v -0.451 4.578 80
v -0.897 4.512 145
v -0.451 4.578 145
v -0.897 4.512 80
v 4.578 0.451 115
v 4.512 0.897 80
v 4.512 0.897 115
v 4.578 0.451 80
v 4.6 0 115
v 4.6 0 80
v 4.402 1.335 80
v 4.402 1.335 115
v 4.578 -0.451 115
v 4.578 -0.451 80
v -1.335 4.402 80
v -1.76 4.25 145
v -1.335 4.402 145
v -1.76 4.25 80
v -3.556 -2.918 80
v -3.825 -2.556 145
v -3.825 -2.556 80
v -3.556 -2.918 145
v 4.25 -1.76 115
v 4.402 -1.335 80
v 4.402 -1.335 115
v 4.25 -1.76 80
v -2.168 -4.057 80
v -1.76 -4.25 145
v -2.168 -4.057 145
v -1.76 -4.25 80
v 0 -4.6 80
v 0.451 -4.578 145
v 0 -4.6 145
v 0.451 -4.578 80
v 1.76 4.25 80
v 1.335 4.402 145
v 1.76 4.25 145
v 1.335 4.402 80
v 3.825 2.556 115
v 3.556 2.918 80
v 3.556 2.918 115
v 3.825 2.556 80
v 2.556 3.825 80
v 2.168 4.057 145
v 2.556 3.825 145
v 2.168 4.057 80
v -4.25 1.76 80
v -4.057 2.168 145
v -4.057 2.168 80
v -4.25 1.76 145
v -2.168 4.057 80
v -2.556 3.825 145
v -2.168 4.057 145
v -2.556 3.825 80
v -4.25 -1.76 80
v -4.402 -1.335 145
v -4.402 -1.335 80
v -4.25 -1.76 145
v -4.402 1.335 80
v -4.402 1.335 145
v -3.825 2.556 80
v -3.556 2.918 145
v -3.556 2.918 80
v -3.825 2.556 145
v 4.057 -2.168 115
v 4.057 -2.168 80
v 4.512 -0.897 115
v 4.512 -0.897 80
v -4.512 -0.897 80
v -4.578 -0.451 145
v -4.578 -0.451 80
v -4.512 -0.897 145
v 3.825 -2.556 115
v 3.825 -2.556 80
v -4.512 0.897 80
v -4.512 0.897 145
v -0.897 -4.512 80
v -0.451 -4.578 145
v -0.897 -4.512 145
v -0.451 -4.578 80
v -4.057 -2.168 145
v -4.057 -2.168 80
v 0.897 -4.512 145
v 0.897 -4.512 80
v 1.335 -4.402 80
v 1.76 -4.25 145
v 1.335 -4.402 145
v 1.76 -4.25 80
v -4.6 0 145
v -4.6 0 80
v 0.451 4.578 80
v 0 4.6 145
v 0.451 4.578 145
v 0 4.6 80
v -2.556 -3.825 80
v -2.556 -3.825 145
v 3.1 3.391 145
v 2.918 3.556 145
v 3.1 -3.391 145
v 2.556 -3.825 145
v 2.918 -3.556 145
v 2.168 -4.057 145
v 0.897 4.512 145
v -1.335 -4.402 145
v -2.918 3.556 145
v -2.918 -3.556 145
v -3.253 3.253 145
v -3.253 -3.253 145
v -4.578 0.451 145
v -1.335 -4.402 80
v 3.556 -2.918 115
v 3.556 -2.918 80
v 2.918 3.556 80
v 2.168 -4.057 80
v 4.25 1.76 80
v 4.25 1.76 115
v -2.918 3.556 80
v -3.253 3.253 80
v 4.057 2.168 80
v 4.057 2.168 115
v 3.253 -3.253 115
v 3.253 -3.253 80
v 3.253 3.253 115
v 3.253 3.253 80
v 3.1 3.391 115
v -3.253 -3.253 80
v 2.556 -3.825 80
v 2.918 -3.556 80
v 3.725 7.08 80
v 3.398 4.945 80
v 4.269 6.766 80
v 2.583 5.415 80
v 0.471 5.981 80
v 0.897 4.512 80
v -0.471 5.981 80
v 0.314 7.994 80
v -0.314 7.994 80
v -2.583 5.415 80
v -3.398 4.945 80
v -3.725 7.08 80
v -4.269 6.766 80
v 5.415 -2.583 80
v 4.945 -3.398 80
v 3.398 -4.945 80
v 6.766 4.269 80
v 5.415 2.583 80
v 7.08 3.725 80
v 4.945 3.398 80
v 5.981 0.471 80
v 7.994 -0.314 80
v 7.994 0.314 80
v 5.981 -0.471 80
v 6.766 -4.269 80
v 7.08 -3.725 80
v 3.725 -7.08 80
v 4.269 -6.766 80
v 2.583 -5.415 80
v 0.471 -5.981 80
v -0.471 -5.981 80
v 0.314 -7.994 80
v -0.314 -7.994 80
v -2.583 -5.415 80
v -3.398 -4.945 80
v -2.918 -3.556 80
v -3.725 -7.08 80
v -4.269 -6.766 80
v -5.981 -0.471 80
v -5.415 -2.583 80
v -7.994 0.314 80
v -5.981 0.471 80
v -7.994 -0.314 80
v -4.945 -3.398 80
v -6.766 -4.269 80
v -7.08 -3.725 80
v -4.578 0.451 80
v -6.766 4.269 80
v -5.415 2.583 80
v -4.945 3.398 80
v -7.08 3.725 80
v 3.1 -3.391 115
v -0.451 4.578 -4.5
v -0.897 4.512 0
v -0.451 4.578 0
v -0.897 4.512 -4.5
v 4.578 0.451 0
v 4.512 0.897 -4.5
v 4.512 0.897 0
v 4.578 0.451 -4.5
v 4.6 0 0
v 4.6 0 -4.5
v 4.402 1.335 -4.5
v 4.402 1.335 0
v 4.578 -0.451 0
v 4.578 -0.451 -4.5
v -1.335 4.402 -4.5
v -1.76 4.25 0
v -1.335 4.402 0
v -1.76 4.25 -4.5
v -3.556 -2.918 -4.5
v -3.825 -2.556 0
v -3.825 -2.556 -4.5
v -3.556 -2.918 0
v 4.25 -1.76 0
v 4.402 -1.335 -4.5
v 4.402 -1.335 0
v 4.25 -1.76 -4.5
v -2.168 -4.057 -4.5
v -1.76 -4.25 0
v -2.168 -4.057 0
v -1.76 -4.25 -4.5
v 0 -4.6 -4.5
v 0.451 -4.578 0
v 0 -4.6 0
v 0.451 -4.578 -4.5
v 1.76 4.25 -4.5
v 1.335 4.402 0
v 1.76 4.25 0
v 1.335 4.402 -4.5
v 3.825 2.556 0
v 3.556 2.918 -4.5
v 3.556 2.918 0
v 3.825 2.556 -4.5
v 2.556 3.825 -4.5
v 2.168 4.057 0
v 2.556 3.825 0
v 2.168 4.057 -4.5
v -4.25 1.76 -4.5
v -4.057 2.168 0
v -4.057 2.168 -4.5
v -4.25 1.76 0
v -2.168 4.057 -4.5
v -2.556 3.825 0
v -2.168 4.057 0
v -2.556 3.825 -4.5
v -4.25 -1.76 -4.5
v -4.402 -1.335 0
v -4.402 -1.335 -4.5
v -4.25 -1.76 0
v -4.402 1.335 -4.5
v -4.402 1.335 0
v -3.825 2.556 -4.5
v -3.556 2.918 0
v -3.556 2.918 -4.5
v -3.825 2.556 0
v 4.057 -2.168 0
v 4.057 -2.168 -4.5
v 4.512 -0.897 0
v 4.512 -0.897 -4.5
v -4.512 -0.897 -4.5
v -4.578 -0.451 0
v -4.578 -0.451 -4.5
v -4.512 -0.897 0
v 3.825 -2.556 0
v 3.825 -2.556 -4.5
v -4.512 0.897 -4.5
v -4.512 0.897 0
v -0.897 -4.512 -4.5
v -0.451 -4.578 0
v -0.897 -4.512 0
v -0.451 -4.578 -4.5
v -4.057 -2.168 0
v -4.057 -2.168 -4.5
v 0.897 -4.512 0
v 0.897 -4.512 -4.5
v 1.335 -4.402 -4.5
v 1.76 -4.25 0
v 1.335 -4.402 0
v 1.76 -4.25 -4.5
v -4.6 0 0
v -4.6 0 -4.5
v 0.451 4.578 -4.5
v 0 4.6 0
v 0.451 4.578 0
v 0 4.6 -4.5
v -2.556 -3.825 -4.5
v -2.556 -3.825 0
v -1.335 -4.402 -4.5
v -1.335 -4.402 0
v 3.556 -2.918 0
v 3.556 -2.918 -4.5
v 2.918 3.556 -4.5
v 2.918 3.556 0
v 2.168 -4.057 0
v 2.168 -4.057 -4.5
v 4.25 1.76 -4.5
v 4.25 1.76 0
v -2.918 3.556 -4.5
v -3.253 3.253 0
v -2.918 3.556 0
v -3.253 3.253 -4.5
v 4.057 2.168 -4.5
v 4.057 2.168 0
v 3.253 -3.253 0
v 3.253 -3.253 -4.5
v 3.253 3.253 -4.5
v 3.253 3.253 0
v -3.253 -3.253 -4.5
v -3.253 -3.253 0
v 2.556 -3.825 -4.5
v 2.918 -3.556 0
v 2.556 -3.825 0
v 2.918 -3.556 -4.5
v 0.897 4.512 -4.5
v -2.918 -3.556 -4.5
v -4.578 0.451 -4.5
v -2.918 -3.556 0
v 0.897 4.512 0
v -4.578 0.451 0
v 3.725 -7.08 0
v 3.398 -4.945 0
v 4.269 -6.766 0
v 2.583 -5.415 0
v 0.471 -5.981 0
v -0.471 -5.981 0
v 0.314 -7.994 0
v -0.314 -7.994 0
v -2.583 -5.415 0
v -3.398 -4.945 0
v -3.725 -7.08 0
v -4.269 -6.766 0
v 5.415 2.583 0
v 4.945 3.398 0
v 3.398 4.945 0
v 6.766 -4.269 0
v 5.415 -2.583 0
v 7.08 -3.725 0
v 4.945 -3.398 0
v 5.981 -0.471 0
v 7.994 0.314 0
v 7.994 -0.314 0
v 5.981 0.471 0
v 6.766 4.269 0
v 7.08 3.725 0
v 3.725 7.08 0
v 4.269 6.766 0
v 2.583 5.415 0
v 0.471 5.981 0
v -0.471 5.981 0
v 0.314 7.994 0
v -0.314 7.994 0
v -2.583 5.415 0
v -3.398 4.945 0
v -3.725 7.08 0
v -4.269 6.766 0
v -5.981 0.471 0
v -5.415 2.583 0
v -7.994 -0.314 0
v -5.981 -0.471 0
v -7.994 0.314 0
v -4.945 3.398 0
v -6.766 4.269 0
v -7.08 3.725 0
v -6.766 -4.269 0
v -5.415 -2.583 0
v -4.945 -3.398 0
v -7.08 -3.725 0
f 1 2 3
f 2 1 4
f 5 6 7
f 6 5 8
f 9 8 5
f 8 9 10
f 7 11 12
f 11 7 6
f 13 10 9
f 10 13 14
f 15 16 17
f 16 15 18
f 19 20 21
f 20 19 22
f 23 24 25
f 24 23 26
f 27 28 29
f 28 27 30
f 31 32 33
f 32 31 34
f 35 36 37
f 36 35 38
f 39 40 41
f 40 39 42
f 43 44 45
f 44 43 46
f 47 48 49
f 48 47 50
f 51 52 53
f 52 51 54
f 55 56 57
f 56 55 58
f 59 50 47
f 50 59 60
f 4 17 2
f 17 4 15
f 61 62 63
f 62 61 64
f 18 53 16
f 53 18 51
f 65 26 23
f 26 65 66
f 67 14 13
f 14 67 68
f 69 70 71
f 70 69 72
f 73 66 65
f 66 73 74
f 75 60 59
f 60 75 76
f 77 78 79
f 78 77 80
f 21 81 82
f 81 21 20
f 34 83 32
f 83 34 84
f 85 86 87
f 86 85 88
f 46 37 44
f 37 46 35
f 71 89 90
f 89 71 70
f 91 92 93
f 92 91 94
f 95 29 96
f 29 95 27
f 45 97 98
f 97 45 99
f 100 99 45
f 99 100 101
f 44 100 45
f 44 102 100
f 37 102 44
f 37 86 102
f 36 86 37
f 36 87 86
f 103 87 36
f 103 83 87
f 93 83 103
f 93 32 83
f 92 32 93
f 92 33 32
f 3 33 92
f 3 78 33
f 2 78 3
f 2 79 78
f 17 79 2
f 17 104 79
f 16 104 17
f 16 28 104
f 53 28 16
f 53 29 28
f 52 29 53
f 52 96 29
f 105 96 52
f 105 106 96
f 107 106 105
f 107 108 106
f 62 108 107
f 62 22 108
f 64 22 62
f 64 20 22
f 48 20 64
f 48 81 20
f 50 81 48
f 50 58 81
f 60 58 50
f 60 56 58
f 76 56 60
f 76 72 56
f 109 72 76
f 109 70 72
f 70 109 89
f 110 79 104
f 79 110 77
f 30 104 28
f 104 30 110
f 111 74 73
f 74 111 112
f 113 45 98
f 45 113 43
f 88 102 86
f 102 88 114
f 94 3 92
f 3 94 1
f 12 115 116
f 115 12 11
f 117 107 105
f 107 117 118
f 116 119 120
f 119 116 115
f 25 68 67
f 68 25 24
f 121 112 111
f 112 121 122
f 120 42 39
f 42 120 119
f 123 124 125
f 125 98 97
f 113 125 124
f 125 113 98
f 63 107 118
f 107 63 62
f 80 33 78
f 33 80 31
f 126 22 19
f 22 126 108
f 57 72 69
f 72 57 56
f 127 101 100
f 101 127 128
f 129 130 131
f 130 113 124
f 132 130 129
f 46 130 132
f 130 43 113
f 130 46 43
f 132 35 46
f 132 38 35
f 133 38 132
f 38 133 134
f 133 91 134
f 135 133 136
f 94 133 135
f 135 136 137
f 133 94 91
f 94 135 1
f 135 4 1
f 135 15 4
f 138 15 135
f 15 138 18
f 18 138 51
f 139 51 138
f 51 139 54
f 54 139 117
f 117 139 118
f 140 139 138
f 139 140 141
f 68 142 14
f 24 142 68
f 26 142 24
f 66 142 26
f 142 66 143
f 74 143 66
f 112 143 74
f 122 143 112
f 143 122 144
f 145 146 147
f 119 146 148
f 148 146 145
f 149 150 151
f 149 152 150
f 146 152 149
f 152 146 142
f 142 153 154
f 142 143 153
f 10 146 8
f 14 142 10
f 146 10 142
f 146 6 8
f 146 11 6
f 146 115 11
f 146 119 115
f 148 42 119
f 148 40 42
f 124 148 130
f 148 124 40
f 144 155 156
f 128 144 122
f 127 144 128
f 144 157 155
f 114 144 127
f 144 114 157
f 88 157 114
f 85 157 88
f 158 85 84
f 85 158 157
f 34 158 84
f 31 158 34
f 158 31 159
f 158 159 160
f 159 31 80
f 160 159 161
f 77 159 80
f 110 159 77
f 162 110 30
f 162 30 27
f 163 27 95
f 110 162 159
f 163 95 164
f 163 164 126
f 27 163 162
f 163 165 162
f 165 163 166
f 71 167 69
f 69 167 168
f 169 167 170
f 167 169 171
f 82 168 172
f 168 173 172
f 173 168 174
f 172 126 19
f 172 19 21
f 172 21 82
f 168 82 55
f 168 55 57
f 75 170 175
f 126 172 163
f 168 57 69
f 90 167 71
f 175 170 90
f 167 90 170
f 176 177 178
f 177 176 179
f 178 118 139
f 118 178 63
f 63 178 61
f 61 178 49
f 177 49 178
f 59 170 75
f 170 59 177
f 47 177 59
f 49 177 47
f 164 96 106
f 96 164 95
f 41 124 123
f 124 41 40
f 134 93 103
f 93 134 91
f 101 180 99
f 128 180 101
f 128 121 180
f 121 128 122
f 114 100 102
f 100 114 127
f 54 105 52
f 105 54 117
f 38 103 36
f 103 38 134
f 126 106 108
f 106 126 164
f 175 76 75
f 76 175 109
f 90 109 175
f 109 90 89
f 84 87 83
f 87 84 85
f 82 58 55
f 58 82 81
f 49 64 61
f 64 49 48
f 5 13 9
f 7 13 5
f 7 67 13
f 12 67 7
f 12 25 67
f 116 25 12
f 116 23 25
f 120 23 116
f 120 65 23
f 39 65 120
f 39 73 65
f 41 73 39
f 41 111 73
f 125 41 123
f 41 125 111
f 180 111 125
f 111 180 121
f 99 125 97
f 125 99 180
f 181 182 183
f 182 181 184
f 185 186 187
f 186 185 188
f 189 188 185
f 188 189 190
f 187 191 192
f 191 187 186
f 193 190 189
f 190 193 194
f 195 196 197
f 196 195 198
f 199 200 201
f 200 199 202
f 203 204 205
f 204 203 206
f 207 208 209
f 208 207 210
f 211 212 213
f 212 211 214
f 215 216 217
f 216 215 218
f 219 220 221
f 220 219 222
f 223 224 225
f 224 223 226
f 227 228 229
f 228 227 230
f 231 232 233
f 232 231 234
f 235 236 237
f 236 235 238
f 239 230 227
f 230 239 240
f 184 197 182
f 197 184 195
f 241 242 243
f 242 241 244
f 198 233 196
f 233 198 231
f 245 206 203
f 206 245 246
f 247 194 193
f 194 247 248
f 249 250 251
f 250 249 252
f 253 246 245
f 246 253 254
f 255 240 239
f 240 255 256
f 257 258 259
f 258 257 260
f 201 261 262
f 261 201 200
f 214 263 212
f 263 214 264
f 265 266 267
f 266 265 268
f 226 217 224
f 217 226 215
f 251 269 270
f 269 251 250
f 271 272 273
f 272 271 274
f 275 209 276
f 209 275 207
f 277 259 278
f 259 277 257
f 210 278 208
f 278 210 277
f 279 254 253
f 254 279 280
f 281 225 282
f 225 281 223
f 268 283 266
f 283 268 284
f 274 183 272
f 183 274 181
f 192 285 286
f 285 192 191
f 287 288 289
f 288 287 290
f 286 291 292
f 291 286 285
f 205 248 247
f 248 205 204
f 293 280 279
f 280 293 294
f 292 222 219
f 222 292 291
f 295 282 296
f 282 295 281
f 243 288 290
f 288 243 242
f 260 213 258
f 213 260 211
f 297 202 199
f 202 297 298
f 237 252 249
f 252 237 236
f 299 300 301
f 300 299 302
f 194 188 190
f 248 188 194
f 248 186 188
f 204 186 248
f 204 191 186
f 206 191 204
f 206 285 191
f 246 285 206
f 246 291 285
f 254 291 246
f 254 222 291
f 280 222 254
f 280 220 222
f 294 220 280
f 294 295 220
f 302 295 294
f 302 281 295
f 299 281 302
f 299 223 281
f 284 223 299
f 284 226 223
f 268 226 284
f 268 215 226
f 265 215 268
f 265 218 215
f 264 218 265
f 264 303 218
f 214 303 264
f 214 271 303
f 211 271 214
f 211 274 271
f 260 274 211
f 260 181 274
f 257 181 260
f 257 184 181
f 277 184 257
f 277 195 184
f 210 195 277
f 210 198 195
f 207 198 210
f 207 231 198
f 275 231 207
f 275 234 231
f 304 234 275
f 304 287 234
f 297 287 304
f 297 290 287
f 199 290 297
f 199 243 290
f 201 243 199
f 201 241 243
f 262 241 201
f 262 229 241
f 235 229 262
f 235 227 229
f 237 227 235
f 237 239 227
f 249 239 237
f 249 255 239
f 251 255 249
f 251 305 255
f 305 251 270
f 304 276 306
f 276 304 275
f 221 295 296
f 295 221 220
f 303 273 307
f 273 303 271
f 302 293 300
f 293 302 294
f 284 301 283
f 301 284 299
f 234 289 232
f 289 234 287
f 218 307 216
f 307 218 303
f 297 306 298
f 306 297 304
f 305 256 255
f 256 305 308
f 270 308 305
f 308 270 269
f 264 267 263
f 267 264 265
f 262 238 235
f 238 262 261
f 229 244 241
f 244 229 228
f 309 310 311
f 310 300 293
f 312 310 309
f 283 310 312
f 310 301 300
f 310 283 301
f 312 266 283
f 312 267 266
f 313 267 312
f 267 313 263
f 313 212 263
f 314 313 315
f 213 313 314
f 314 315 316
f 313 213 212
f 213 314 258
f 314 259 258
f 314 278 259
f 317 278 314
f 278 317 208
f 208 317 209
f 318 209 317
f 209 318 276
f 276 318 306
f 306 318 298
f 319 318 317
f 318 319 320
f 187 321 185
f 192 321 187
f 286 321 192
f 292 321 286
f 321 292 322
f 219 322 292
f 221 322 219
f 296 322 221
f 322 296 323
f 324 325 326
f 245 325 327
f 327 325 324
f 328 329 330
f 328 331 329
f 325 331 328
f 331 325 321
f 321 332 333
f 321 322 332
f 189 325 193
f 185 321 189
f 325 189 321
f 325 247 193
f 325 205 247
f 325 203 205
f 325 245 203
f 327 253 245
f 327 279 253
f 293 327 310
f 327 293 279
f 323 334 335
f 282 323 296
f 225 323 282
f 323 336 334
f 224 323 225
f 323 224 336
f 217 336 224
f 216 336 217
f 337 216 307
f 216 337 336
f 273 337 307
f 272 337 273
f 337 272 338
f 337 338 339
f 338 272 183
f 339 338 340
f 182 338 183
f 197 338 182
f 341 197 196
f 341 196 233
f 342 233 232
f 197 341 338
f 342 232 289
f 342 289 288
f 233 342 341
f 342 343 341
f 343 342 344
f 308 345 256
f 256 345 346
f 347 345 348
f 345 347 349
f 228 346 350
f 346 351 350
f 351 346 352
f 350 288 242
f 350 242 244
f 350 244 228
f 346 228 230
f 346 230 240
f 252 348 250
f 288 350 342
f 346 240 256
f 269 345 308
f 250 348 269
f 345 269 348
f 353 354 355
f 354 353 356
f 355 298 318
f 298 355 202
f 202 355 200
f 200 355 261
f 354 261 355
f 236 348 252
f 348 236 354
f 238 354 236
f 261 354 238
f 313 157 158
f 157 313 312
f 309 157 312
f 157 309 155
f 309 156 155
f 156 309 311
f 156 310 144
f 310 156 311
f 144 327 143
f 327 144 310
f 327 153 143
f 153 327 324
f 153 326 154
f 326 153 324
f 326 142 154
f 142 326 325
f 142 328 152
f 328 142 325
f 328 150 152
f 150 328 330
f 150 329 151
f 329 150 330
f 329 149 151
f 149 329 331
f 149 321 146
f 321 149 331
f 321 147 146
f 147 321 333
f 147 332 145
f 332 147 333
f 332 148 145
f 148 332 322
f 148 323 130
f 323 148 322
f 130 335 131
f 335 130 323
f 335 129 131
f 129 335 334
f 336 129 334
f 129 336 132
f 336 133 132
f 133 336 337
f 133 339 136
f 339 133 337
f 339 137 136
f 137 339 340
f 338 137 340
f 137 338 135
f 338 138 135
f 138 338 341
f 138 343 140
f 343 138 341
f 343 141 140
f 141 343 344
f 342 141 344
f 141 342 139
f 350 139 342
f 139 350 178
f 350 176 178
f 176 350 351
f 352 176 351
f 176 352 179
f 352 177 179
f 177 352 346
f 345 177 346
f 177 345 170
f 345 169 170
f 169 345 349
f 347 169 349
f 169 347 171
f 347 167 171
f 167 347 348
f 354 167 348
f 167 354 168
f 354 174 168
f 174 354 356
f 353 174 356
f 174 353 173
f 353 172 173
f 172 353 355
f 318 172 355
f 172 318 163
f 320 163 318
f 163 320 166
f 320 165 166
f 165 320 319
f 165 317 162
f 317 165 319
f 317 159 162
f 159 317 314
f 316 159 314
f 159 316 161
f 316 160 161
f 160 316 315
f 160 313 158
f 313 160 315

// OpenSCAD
// FILE: 03_Gear_Rod_D_Cut_V8.5.scad
// UPDATED: Calibrated bearing pins for 0.3mm printer error.
// COMPATIBILITY: V11.9 Chassis & Lid.

$fn = 64;
h = 140;        // Total height
th = 80;        // Gear teeth height
d_cut_h = 30;   // Mast engagement depth
rod_dia = 9.5;
pin_dia = 9.2;  // CALIBRATED: Adjusted from 9.4 to 9.2 for 10mm bearing ID

// 1. Bottom Bearing Pin (Fits into Chassis Podium)
translate([0, 0, -4.5]) cylinder(h = 5, d = pin_dia);

// 2. Gear Teeth (12 teeth)
linear_extrude(height = th) gear_profile(12, 8, 6);

// 3. Top Section (Lid bearing interface and D-cut)
translate([0, 0, th]) {
    difference() {
        // This cylinder passes through the Lid bearing
        cylinder(h = h - th + 5, d = pin_dia);
        
        // The D-cut: Standard flat for mast orientation
        translate([pin_dia/2 - 1.5, -5, h - th - d_cut_h + 5]) 
            cube([5, 10, d_cut_h + 1]);
    }
}

module gear_profile(teeth, r_out, r_in, flat=0.6) {
    angle_step = 360/teeth;
    points = [for (i = [0:teeth-1]) each [
        [r_in*cos(i*angle_step-angle_step*flat/4), r_in*sin(i*angle_step-angle_step*flat/4)],
        [r_out*cos(i*angle_step-angle_step*flat/8), r_out*sin(i*angle_step-angle_step*flat/8)],
        [r_out*cos(i*angle_step+angle_step*flat/8), r_out*sin(i*angle_step+angle_step*flat/8)],
        [r_in*cos(i*angle_step+angle_step*flat/4), r_in*sin(i*angle_step+angle_step*flat/4)]
    ]];
    polygon(points);
}
